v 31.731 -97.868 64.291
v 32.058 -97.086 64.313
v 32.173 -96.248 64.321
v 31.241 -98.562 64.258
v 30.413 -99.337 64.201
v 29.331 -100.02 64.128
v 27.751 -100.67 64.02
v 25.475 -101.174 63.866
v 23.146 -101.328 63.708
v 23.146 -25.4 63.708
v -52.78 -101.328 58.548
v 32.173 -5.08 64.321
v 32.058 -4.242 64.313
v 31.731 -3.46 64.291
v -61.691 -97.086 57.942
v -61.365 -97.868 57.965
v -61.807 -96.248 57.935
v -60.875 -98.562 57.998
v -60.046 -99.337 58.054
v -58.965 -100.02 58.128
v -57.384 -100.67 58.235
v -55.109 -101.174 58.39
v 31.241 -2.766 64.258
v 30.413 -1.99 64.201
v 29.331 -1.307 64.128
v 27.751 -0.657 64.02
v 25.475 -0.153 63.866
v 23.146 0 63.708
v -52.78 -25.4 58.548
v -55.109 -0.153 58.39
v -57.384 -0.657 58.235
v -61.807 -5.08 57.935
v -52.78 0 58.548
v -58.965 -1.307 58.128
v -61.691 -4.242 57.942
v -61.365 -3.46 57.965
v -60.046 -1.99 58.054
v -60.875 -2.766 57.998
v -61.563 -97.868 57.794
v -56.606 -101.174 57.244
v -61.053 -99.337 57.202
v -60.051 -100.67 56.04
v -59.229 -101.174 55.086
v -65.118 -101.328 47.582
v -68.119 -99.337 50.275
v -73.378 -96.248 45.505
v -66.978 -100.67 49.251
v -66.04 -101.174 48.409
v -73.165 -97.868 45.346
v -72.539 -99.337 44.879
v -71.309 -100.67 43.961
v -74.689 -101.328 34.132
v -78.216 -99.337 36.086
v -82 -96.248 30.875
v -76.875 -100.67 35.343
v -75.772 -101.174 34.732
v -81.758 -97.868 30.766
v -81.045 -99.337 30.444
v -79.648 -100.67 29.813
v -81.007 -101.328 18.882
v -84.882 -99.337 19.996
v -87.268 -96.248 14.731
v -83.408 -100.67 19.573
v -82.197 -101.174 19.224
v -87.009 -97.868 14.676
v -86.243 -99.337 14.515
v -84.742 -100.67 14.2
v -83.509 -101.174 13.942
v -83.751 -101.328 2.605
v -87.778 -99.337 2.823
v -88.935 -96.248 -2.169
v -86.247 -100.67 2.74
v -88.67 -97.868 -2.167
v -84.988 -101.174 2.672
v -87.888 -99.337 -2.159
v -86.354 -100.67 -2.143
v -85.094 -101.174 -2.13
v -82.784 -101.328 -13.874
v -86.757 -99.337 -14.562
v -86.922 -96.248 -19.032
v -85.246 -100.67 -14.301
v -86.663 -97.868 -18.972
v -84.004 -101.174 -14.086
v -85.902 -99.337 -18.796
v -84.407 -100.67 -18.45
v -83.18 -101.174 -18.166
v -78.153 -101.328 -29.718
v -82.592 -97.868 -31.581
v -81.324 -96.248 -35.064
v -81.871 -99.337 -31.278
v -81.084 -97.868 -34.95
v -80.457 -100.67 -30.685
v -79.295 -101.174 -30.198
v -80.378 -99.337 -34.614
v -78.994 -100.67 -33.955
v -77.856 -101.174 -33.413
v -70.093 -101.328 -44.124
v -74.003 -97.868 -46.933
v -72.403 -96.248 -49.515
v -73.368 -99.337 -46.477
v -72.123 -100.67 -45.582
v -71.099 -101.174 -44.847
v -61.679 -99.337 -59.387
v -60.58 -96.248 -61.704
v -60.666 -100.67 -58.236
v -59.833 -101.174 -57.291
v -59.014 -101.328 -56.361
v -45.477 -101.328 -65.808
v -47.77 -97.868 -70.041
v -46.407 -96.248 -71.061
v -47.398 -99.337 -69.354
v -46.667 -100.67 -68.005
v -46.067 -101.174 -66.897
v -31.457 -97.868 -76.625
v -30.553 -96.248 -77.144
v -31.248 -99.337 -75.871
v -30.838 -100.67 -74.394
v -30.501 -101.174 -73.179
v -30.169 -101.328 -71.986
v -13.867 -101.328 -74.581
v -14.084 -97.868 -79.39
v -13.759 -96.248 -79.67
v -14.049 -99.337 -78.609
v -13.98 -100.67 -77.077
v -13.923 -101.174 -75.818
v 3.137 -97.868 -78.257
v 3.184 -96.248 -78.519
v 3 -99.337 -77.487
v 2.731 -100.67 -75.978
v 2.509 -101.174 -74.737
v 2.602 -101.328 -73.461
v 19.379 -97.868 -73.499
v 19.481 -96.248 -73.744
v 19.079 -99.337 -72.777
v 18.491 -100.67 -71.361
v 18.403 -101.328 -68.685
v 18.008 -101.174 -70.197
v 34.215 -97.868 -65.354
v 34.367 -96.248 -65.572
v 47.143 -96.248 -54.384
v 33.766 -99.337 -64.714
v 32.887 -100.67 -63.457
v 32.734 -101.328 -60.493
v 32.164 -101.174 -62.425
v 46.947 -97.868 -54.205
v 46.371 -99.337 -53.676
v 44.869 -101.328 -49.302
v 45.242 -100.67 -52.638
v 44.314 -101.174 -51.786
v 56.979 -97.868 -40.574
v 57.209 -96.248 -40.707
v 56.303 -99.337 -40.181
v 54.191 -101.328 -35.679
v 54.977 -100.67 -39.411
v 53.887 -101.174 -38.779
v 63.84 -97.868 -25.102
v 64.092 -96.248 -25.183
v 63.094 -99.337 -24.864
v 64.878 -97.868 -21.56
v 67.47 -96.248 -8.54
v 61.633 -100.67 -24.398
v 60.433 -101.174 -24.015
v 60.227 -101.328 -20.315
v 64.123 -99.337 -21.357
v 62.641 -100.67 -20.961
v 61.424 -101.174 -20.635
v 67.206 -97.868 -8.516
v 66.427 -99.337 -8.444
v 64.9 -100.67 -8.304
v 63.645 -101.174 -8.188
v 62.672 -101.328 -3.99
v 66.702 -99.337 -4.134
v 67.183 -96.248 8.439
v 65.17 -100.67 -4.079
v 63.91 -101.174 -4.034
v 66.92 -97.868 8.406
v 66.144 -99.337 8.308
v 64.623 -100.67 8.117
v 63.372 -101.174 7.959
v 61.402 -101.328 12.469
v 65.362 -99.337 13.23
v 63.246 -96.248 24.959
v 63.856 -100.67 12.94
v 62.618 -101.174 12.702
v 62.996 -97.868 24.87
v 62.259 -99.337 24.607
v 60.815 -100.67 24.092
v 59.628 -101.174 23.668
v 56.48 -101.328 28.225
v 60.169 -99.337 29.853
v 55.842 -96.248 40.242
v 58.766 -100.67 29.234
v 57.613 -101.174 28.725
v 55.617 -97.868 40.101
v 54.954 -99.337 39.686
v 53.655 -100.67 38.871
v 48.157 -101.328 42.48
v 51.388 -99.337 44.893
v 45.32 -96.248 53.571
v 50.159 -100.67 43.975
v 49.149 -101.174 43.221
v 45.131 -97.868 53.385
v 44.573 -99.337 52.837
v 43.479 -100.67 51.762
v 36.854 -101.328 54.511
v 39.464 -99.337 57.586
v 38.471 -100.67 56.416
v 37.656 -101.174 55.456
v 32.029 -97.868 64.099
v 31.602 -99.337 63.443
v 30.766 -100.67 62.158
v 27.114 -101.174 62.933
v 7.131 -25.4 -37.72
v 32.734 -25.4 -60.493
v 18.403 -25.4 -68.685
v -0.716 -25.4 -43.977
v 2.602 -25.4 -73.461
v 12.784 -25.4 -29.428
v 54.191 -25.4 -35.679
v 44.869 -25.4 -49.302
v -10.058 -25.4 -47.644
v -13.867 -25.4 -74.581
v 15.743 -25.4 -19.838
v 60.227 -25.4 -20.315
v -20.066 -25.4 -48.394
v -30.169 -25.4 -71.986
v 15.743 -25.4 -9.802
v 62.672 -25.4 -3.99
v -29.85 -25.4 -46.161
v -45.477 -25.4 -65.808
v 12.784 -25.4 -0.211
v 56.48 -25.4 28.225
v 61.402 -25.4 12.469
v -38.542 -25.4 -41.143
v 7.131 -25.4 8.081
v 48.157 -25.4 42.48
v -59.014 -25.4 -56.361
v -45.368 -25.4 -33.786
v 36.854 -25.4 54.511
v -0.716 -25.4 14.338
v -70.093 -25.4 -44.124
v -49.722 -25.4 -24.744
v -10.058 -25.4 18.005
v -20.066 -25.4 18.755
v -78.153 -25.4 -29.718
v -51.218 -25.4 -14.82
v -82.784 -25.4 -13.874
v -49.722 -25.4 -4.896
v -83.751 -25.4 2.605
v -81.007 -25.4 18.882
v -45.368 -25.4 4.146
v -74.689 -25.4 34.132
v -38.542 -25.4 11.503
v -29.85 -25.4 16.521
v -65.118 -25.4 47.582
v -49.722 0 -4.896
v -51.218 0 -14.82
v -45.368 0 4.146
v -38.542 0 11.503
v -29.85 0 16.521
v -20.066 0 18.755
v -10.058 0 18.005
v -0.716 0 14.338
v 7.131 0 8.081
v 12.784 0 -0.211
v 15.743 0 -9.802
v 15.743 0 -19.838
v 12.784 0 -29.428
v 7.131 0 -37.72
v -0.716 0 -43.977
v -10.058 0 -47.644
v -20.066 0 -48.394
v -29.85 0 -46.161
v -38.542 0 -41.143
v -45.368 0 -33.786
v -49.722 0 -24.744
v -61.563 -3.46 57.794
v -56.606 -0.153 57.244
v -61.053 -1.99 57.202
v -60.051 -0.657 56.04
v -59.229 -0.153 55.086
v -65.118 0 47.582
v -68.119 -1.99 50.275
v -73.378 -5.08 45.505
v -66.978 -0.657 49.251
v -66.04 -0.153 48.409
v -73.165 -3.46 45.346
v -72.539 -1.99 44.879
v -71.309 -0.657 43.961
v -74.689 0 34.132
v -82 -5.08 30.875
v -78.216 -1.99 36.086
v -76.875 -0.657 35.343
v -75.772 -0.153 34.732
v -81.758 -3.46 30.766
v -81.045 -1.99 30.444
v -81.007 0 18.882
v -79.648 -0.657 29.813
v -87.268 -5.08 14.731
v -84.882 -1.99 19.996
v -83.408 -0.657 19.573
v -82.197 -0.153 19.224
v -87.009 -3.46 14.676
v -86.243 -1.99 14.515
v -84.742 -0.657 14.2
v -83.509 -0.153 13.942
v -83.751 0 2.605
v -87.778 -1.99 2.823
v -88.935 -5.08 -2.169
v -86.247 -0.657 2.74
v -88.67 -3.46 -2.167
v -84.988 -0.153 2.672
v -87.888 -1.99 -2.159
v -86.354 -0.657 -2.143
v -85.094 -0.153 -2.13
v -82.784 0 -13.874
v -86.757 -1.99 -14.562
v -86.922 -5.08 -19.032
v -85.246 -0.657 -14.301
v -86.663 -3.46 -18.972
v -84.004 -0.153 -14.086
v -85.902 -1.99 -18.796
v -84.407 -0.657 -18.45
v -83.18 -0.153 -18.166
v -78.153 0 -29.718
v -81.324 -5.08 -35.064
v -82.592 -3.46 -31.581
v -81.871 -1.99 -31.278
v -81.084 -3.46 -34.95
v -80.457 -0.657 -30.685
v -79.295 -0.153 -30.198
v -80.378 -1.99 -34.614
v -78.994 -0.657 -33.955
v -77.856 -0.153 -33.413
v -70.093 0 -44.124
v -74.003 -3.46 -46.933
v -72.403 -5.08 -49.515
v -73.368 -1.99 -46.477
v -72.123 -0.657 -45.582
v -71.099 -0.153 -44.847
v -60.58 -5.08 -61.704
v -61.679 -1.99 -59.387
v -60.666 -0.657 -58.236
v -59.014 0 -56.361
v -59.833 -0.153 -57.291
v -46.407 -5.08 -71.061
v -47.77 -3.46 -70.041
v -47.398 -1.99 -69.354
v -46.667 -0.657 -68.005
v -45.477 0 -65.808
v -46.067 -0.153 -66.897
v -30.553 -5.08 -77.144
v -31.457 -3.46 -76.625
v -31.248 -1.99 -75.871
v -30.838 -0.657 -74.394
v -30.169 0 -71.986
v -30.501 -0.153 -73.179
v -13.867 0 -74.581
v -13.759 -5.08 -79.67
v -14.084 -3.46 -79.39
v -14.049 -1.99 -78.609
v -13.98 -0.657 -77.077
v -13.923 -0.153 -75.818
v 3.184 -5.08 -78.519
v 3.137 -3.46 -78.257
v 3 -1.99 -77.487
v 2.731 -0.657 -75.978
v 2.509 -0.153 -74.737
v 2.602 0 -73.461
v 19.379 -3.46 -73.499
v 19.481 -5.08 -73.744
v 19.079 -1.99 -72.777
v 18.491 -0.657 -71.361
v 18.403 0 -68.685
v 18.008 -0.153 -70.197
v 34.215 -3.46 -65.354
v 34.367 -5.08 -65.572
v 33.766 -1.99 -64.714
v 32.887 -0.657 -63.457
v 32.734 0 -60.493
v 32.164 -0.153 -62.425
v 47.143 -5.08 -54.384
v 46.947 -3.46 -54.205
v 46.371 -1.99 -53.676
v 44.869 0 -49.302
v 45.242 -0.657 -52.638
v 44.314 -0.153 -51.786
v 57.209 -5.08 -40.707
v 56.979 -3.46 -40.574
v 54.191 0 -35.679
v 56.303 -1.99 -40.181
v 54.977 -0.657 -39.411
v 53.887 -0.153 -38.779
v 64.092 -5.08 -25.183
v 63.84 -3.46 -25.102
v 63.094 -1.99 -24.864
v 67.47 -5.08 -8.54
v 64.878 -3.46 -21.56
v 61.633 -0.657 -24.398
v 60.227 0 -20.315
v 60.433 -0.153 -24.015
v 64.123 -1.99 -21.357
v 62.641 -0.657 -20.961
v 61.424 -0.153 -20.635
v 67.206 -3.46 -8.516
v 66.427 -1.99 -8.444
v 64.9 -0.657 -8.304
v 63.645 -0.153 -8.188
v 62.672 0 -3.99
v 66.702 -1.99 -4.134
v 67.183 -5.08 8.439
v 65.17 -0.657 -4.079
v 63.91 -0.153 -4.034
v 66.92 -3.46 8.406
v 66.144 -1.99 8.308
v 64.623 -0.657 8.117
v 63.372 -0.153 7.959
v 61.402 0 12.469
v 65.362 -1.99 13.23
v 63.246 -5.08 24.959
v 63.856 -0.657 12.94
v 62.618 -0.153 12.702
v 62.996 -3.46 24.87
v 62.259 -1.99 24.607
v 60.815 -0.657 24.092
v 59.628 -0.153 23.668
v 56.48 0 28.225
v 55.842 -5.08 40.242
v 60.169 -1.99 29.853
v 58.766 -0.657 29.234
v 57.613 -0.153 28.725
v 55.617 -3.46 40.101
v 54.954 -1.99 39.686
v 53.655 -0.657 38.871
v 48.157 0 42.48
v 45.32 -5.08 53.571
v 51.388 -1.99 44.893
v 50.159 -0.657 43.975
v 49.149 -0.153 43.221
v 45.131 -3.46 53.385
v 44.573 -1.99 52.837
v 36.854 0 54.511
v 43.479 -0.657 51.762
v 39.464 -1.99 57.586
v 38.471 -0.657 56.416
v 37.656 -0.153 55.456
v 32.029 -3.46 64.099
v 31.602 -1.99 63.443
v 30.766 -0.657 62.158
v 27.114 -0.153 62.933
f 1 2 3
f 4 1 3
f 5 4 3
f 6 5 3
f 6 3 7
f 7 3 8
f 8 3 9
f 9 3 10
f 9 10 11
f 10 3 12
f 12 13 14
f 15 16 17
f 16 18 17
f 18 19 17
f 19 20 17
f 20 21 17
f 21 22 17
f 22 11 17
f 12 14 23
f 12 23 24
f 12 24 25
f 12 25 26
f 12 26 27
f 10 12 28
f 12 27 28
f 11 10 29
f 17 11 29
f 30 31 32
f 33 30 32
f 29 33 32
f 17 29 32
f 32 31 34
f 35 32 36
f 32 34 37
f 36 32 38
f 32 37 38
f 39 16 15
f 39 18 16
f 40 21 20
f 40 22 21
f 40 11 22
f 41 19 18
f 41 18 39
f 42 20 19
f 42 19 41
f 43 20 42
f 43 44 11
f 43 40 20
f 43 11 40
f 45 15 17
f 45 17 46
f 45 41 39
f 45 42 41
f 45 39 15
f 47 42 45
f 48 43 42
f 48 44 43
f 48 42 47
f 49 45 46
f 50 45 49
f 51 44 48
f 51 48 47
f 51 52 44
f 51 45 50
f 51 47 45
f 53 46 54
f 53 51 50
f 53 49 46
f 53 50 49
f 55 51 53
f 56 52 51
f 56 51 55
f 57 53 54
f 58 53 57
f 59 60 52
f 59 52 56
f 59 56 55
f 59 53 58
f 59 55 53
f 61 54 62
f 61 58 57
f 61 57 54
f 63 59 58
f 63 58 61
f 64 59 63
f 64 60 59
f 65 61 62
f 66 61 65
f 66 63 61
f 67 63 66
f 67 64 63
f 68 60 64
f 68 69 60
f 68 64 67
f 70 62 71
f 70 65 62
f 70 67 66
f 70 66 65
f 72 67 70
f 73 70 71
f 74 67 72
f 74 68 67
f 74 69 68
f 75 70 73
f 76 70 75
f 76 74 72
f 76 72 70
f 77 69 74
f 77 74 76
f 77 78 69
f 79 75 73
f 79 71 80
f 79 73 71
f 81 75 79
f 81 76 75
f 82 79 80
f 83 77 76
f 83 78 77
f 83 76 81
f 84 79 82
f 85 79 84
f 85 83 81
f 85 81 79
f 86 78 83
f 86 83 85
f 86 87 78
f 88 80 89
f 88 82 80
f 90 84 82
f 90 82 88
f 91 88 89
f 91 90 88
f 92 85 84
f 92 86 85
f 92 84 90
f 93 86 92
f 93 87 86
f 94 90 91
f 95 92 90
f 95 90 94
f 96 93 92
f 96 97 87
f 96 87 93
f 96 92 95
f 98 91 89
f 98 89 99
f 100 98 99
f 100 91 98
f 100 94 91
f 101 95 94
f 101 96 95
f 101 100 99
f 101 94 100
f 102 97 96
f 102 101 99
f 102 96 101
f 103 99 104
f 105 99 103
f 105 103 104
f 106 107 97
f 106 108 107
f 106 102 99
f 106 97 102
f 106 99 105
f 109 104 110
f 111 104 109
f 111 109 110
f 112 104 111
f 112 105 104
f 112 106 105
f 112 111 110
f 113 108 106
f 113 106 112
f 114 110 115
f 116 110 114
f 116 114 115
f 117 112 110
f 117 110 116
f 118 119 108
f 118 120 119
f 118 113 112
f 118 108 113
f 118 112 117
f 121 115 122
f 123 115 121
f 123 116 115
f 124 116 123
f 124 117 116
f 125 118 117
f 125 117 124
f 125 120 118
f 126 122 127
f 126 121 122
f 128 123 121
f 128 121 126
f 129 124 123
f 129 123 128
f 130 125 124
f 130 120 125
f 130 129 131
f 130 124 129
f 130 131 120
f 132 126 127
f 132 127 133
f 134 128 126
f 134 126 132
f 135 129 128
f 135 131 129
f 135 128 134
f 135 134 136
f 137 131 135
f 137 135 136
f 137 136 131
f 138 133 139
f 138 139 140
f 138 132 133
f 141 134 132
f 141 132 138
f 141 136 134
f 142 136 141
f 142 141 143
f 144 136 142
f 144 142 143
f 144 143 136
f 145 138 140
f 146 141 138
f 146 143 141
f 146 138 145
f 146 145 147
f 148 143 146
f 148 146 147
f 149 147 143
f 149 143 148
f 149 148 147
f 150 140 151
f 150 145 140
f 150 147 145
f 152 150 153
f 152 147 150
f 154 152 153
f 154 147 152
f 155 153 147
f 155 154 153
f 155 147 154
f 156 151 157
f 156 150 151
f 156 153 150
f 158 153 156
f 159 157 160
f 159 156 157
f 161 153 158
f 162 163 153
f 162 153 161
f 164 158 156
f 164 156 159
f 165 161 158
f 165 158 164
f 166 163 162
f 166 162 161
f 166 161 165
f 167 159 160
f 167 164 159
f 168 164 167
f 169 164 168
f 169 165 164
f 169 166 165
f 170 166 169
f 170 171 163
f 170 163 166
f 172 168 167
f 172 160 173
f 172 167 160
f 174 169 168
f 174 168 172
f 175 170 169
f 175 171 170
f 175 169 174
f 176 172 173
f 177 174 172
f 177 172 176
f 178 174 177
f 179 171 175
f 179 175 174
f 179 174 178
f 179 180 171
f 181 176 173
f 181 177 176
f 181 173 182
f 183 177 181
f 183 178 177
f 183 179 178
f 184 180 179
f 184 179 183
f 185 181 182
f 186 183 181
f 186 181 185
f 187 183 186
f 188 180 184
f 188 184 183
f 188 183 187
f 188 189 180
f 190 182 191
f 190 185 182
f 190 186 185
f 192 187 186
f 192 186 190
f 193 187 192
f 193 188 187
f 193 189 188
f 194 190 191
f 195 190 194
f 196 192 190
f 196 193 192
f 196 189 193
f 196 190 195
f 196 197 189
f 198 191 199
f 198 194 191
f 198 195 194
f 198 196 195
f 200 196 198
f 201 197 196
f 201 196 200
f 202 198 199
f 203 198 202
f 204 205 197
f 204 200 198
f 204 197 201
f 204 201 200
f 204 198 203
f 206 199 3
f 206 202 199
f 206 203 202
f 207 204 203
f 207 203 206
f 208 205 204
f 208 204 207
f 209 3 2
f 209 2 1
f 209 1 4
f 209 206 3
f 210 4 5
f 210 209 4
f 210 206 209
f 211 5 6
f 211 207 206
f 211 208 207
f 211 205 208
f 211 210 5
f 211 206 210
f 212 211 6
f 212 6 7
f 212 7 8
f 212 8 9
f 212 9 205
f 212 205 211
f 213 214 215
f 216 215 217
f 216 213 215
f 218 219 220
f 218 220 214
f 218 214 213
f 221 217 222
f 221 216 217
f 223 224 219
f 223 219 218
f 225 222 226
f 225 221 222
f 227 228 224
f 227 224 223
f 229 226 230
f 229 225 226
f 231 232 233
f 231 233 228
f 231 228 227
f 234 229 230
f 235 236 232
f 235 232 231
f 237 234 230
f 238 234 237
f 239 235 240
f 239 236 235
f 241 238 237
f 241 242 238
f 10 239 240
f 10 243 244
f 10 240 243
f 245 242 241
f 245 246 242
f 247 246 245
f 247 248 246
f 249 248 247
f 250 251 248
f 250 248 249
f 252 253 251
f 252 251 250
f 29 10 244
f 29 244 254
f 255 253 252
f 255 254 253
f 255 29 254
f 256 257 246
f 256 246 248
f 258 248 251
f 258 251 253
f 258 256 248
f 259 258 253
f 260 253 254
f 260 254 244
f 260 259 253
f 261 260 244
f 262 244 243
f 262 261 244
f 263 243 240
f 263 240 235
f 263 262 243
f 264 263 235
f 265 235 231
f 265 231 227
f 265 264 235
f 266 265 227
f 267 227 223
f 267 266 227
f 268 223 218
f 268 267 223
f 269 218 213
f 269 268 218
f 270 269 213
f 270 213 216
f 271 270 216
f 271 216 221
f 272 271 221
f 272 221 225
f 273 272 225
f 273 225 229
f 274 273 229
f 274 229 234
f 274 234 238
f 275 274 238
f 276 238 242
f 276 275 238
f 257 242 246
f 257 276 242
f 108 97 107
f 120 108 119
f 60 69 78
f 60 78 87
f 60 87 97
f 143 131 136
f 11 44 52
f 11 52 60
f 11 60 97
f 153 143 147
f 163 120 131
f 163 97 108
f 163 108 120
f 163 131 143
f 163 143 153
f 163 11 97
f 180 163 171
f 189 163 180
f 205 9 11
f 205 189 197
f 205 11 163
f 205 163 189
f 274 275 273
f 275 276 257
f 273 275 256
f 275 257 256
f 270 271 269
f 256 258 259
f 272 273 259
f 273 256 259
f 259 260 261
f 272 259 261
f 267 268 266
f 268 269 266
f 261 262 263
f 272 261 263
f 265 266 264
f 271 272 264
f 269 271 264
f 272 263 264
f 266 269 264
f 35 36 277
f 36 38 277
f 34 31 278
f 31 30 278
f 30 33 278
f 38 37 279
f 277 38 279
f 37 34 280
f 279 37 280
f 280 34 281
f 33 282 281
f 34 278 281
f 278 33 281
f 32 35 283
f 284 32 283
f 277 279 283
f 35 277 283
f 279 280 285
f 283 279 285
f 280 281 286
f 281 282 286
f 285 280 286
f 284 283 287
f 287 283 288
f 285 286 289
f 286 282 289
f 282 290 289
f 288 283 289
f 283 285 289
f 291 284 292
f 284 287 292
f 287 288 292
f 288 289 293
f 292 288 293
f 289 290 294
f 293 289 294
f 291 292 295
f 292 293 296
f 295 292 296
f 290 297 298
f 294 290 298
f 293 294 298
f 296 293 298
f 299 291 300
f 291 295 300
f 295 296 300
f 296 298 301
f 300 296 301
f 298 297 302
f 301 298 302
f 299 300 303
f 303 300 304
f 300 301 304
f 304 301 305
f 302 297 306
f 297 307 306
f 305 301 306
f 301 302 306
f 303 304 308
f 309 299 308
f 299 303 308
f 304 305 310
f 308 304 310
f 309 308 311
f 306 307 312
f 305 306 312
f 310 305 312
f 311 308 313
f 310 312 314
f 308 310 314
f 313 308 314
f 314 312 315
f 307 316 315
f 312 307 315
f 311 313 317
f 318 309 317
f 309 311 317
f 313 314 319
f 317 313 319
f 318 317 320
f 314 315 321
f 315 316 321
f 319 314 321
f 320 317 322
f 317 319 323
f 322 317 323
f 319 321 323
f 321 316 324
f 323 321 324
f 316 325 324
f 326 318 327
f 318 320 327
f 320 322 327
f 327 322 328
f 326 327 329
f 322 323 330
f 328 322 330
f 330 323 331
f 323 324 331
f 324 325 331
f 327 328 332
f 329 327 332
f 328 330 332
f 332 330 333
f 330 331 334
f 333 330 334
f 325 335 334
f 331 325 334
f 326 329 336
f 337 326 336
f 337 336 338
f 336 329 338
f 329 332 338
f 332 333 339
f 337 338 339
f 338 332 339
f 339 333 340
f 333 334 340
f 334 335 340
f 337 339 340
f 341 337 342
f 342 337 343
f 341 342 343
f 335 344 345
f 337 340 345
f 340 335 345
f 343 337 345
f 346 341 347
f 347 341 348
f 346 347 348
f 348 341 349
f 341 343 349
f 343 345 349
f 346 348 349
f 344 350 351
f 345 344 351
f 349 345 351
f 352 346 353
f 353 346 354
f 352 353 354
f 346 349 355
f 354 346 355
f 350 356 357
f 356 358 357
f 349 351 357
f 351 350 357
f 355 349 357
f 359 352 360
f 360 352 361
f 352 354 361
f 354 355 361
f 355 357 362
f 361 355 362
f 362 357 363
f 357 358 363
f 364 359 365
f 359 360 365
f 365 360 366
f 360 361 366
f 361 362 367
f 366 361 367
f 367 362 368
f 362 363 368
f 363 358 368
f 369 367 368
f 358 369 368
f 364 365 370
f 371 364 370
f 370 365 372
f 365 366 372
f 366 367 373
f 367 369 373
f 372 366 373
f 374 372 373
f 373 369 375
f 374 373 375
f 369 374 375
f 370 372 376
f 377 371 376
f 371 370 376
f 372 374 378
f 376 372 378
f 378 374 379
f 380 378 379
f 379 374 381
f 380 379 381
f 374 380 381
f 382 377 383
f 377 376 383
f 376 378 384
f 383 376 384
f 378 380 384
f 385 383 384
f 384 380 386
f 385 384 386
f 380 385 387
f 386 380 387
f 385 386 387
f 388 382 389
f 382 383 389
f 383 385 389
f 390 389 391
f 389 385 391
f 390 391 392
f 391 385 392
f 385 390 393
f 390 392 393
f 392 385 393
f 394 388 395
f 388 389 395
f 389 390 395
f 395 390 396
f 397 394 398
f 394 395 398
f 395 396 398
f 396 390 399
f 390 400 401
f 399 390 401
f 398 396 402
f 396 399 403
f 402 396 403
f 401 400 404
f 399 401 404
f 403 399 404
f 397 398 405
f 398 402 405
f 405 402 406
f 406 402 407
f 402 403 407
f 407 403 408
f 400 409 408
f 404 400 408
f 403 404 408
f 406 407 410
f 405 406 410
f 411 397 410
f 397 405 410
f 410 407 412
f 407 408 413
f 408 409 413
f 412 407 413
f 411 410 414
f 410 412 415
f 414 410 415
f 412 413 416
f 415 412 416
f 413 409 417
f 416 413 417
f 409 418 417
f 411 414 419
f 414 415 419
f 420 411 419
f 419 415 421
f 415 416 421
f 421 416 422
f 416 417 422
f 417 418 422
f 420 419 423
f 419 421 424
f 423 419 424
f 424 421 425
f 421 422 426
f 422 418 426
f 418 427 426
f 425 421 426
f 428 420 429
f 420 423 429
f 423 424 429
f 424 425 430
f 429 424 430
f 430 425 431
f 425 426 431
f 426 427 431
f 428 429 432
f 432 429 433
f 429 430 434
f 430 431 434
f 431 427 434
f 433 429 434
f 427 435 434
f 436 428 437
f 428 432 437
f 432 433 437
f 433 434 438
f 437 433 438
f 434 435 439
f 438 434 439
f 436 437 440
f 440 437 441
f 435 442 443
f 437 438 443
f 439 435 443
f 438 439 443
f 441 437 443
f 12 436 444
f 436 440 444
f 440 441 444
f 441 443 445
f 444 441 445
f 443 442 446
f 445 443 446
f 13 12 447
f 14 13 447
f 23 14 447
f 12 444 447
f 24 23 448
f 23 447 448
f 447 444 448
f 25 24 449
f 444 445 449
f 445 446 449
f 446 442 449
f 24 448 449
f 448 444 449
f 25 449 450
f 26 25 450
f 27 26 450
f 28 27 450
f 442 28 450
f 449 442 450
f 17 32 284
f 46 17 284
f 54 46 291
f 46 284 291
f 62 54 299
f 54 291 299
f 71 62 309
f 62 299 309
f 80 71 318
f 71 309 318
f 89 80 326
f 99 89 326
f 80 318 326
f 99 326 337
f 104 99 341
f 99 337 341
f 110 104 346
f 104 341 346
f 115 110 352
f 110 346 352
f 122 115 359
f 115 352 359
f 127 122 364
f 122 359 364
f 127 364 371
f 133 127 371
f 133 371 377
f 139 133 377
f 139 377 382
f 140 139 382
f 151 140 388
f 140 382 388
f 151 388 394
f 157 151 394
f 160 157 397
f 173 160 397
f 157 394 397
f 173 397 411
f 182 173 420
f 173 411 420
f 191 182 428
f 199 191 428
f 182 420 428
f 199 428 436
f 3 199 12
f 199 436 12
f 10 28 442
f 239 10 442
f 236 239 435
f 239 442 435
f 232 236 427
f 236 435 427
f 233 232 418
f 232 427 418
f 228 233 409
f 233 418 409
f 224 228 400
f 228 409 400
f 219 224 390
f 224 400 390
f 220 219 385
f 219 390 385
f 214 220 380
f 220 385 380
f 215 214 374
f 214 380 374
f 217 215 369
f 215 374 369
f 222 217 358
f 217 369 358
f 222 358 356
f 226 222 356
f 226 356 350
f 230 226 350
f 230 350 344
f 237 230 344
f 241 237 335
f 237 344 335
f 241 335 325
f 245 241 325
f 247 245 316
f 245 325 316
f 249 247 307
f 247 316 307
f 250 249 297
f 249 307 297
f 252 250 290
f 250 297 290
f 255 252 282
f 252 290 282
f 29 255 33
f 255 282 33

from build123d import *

# Parameters (mm, degrees)
F1_DEPTH = 101.3275142759
F2_R     = 5.08
F3_R     = 5.08
F4_R     = 33.6683926693
F5_DEPTH = 25.4


with BuildPart() as f1:
    # F0 (on Front) → F1 (new body)
    with BuildSketch(Plane.XZ):
        with BuildLine():
            Line((32.1733355522, 64.3209666014), (-61.8066638708, 57.9346120358))
            ThreePointArc((-61.8066638708, 57.9346120358), (-5.2566823209, -79.5545167495), (32.1733355522, 64.3209666014))
        make_face()
    extrude(amount=F1_DEPTH)

    # F2
    f2_edges = [f1.edges().sort_by_distance(p)[0] for p in [
        (-5.256682, -101.327514, -79.554517),
    ]]
    fillet(f2_edges, radius=F2_R)

    # F3
    f3_edges = [f1.edges().sort_by_distance(p)[0] for p in [
        (-5.256682, 0, -79.554517),
    ]]
    fillet(f3_edges, radius=F3_R)

    # F4 (on face) → F5 (cut)
    with BuildSketch(Plane(origin=(0, 0, 0), x_dir=(-1, 0, 0), z_dir=(0, 1, 0))):
        with BuildLine():
            ThreePointArc((-23.146174833, 63.7075313021), (5.6010963761, -74.4862054964), (52.7795031516, 58.548047335))
            Line((52.7795031516, 58.548047335), (-23.146174833, 63.7075313021))
        make_face()
        with Locations((17.5497084856, -14.8196211085)):
            Circle(F4_R, mode=Mode.SUBTRACT)
    extrude(amount=-F5_DEPTH, mode=Mode.SUBTRACT)


solid = f1.part
